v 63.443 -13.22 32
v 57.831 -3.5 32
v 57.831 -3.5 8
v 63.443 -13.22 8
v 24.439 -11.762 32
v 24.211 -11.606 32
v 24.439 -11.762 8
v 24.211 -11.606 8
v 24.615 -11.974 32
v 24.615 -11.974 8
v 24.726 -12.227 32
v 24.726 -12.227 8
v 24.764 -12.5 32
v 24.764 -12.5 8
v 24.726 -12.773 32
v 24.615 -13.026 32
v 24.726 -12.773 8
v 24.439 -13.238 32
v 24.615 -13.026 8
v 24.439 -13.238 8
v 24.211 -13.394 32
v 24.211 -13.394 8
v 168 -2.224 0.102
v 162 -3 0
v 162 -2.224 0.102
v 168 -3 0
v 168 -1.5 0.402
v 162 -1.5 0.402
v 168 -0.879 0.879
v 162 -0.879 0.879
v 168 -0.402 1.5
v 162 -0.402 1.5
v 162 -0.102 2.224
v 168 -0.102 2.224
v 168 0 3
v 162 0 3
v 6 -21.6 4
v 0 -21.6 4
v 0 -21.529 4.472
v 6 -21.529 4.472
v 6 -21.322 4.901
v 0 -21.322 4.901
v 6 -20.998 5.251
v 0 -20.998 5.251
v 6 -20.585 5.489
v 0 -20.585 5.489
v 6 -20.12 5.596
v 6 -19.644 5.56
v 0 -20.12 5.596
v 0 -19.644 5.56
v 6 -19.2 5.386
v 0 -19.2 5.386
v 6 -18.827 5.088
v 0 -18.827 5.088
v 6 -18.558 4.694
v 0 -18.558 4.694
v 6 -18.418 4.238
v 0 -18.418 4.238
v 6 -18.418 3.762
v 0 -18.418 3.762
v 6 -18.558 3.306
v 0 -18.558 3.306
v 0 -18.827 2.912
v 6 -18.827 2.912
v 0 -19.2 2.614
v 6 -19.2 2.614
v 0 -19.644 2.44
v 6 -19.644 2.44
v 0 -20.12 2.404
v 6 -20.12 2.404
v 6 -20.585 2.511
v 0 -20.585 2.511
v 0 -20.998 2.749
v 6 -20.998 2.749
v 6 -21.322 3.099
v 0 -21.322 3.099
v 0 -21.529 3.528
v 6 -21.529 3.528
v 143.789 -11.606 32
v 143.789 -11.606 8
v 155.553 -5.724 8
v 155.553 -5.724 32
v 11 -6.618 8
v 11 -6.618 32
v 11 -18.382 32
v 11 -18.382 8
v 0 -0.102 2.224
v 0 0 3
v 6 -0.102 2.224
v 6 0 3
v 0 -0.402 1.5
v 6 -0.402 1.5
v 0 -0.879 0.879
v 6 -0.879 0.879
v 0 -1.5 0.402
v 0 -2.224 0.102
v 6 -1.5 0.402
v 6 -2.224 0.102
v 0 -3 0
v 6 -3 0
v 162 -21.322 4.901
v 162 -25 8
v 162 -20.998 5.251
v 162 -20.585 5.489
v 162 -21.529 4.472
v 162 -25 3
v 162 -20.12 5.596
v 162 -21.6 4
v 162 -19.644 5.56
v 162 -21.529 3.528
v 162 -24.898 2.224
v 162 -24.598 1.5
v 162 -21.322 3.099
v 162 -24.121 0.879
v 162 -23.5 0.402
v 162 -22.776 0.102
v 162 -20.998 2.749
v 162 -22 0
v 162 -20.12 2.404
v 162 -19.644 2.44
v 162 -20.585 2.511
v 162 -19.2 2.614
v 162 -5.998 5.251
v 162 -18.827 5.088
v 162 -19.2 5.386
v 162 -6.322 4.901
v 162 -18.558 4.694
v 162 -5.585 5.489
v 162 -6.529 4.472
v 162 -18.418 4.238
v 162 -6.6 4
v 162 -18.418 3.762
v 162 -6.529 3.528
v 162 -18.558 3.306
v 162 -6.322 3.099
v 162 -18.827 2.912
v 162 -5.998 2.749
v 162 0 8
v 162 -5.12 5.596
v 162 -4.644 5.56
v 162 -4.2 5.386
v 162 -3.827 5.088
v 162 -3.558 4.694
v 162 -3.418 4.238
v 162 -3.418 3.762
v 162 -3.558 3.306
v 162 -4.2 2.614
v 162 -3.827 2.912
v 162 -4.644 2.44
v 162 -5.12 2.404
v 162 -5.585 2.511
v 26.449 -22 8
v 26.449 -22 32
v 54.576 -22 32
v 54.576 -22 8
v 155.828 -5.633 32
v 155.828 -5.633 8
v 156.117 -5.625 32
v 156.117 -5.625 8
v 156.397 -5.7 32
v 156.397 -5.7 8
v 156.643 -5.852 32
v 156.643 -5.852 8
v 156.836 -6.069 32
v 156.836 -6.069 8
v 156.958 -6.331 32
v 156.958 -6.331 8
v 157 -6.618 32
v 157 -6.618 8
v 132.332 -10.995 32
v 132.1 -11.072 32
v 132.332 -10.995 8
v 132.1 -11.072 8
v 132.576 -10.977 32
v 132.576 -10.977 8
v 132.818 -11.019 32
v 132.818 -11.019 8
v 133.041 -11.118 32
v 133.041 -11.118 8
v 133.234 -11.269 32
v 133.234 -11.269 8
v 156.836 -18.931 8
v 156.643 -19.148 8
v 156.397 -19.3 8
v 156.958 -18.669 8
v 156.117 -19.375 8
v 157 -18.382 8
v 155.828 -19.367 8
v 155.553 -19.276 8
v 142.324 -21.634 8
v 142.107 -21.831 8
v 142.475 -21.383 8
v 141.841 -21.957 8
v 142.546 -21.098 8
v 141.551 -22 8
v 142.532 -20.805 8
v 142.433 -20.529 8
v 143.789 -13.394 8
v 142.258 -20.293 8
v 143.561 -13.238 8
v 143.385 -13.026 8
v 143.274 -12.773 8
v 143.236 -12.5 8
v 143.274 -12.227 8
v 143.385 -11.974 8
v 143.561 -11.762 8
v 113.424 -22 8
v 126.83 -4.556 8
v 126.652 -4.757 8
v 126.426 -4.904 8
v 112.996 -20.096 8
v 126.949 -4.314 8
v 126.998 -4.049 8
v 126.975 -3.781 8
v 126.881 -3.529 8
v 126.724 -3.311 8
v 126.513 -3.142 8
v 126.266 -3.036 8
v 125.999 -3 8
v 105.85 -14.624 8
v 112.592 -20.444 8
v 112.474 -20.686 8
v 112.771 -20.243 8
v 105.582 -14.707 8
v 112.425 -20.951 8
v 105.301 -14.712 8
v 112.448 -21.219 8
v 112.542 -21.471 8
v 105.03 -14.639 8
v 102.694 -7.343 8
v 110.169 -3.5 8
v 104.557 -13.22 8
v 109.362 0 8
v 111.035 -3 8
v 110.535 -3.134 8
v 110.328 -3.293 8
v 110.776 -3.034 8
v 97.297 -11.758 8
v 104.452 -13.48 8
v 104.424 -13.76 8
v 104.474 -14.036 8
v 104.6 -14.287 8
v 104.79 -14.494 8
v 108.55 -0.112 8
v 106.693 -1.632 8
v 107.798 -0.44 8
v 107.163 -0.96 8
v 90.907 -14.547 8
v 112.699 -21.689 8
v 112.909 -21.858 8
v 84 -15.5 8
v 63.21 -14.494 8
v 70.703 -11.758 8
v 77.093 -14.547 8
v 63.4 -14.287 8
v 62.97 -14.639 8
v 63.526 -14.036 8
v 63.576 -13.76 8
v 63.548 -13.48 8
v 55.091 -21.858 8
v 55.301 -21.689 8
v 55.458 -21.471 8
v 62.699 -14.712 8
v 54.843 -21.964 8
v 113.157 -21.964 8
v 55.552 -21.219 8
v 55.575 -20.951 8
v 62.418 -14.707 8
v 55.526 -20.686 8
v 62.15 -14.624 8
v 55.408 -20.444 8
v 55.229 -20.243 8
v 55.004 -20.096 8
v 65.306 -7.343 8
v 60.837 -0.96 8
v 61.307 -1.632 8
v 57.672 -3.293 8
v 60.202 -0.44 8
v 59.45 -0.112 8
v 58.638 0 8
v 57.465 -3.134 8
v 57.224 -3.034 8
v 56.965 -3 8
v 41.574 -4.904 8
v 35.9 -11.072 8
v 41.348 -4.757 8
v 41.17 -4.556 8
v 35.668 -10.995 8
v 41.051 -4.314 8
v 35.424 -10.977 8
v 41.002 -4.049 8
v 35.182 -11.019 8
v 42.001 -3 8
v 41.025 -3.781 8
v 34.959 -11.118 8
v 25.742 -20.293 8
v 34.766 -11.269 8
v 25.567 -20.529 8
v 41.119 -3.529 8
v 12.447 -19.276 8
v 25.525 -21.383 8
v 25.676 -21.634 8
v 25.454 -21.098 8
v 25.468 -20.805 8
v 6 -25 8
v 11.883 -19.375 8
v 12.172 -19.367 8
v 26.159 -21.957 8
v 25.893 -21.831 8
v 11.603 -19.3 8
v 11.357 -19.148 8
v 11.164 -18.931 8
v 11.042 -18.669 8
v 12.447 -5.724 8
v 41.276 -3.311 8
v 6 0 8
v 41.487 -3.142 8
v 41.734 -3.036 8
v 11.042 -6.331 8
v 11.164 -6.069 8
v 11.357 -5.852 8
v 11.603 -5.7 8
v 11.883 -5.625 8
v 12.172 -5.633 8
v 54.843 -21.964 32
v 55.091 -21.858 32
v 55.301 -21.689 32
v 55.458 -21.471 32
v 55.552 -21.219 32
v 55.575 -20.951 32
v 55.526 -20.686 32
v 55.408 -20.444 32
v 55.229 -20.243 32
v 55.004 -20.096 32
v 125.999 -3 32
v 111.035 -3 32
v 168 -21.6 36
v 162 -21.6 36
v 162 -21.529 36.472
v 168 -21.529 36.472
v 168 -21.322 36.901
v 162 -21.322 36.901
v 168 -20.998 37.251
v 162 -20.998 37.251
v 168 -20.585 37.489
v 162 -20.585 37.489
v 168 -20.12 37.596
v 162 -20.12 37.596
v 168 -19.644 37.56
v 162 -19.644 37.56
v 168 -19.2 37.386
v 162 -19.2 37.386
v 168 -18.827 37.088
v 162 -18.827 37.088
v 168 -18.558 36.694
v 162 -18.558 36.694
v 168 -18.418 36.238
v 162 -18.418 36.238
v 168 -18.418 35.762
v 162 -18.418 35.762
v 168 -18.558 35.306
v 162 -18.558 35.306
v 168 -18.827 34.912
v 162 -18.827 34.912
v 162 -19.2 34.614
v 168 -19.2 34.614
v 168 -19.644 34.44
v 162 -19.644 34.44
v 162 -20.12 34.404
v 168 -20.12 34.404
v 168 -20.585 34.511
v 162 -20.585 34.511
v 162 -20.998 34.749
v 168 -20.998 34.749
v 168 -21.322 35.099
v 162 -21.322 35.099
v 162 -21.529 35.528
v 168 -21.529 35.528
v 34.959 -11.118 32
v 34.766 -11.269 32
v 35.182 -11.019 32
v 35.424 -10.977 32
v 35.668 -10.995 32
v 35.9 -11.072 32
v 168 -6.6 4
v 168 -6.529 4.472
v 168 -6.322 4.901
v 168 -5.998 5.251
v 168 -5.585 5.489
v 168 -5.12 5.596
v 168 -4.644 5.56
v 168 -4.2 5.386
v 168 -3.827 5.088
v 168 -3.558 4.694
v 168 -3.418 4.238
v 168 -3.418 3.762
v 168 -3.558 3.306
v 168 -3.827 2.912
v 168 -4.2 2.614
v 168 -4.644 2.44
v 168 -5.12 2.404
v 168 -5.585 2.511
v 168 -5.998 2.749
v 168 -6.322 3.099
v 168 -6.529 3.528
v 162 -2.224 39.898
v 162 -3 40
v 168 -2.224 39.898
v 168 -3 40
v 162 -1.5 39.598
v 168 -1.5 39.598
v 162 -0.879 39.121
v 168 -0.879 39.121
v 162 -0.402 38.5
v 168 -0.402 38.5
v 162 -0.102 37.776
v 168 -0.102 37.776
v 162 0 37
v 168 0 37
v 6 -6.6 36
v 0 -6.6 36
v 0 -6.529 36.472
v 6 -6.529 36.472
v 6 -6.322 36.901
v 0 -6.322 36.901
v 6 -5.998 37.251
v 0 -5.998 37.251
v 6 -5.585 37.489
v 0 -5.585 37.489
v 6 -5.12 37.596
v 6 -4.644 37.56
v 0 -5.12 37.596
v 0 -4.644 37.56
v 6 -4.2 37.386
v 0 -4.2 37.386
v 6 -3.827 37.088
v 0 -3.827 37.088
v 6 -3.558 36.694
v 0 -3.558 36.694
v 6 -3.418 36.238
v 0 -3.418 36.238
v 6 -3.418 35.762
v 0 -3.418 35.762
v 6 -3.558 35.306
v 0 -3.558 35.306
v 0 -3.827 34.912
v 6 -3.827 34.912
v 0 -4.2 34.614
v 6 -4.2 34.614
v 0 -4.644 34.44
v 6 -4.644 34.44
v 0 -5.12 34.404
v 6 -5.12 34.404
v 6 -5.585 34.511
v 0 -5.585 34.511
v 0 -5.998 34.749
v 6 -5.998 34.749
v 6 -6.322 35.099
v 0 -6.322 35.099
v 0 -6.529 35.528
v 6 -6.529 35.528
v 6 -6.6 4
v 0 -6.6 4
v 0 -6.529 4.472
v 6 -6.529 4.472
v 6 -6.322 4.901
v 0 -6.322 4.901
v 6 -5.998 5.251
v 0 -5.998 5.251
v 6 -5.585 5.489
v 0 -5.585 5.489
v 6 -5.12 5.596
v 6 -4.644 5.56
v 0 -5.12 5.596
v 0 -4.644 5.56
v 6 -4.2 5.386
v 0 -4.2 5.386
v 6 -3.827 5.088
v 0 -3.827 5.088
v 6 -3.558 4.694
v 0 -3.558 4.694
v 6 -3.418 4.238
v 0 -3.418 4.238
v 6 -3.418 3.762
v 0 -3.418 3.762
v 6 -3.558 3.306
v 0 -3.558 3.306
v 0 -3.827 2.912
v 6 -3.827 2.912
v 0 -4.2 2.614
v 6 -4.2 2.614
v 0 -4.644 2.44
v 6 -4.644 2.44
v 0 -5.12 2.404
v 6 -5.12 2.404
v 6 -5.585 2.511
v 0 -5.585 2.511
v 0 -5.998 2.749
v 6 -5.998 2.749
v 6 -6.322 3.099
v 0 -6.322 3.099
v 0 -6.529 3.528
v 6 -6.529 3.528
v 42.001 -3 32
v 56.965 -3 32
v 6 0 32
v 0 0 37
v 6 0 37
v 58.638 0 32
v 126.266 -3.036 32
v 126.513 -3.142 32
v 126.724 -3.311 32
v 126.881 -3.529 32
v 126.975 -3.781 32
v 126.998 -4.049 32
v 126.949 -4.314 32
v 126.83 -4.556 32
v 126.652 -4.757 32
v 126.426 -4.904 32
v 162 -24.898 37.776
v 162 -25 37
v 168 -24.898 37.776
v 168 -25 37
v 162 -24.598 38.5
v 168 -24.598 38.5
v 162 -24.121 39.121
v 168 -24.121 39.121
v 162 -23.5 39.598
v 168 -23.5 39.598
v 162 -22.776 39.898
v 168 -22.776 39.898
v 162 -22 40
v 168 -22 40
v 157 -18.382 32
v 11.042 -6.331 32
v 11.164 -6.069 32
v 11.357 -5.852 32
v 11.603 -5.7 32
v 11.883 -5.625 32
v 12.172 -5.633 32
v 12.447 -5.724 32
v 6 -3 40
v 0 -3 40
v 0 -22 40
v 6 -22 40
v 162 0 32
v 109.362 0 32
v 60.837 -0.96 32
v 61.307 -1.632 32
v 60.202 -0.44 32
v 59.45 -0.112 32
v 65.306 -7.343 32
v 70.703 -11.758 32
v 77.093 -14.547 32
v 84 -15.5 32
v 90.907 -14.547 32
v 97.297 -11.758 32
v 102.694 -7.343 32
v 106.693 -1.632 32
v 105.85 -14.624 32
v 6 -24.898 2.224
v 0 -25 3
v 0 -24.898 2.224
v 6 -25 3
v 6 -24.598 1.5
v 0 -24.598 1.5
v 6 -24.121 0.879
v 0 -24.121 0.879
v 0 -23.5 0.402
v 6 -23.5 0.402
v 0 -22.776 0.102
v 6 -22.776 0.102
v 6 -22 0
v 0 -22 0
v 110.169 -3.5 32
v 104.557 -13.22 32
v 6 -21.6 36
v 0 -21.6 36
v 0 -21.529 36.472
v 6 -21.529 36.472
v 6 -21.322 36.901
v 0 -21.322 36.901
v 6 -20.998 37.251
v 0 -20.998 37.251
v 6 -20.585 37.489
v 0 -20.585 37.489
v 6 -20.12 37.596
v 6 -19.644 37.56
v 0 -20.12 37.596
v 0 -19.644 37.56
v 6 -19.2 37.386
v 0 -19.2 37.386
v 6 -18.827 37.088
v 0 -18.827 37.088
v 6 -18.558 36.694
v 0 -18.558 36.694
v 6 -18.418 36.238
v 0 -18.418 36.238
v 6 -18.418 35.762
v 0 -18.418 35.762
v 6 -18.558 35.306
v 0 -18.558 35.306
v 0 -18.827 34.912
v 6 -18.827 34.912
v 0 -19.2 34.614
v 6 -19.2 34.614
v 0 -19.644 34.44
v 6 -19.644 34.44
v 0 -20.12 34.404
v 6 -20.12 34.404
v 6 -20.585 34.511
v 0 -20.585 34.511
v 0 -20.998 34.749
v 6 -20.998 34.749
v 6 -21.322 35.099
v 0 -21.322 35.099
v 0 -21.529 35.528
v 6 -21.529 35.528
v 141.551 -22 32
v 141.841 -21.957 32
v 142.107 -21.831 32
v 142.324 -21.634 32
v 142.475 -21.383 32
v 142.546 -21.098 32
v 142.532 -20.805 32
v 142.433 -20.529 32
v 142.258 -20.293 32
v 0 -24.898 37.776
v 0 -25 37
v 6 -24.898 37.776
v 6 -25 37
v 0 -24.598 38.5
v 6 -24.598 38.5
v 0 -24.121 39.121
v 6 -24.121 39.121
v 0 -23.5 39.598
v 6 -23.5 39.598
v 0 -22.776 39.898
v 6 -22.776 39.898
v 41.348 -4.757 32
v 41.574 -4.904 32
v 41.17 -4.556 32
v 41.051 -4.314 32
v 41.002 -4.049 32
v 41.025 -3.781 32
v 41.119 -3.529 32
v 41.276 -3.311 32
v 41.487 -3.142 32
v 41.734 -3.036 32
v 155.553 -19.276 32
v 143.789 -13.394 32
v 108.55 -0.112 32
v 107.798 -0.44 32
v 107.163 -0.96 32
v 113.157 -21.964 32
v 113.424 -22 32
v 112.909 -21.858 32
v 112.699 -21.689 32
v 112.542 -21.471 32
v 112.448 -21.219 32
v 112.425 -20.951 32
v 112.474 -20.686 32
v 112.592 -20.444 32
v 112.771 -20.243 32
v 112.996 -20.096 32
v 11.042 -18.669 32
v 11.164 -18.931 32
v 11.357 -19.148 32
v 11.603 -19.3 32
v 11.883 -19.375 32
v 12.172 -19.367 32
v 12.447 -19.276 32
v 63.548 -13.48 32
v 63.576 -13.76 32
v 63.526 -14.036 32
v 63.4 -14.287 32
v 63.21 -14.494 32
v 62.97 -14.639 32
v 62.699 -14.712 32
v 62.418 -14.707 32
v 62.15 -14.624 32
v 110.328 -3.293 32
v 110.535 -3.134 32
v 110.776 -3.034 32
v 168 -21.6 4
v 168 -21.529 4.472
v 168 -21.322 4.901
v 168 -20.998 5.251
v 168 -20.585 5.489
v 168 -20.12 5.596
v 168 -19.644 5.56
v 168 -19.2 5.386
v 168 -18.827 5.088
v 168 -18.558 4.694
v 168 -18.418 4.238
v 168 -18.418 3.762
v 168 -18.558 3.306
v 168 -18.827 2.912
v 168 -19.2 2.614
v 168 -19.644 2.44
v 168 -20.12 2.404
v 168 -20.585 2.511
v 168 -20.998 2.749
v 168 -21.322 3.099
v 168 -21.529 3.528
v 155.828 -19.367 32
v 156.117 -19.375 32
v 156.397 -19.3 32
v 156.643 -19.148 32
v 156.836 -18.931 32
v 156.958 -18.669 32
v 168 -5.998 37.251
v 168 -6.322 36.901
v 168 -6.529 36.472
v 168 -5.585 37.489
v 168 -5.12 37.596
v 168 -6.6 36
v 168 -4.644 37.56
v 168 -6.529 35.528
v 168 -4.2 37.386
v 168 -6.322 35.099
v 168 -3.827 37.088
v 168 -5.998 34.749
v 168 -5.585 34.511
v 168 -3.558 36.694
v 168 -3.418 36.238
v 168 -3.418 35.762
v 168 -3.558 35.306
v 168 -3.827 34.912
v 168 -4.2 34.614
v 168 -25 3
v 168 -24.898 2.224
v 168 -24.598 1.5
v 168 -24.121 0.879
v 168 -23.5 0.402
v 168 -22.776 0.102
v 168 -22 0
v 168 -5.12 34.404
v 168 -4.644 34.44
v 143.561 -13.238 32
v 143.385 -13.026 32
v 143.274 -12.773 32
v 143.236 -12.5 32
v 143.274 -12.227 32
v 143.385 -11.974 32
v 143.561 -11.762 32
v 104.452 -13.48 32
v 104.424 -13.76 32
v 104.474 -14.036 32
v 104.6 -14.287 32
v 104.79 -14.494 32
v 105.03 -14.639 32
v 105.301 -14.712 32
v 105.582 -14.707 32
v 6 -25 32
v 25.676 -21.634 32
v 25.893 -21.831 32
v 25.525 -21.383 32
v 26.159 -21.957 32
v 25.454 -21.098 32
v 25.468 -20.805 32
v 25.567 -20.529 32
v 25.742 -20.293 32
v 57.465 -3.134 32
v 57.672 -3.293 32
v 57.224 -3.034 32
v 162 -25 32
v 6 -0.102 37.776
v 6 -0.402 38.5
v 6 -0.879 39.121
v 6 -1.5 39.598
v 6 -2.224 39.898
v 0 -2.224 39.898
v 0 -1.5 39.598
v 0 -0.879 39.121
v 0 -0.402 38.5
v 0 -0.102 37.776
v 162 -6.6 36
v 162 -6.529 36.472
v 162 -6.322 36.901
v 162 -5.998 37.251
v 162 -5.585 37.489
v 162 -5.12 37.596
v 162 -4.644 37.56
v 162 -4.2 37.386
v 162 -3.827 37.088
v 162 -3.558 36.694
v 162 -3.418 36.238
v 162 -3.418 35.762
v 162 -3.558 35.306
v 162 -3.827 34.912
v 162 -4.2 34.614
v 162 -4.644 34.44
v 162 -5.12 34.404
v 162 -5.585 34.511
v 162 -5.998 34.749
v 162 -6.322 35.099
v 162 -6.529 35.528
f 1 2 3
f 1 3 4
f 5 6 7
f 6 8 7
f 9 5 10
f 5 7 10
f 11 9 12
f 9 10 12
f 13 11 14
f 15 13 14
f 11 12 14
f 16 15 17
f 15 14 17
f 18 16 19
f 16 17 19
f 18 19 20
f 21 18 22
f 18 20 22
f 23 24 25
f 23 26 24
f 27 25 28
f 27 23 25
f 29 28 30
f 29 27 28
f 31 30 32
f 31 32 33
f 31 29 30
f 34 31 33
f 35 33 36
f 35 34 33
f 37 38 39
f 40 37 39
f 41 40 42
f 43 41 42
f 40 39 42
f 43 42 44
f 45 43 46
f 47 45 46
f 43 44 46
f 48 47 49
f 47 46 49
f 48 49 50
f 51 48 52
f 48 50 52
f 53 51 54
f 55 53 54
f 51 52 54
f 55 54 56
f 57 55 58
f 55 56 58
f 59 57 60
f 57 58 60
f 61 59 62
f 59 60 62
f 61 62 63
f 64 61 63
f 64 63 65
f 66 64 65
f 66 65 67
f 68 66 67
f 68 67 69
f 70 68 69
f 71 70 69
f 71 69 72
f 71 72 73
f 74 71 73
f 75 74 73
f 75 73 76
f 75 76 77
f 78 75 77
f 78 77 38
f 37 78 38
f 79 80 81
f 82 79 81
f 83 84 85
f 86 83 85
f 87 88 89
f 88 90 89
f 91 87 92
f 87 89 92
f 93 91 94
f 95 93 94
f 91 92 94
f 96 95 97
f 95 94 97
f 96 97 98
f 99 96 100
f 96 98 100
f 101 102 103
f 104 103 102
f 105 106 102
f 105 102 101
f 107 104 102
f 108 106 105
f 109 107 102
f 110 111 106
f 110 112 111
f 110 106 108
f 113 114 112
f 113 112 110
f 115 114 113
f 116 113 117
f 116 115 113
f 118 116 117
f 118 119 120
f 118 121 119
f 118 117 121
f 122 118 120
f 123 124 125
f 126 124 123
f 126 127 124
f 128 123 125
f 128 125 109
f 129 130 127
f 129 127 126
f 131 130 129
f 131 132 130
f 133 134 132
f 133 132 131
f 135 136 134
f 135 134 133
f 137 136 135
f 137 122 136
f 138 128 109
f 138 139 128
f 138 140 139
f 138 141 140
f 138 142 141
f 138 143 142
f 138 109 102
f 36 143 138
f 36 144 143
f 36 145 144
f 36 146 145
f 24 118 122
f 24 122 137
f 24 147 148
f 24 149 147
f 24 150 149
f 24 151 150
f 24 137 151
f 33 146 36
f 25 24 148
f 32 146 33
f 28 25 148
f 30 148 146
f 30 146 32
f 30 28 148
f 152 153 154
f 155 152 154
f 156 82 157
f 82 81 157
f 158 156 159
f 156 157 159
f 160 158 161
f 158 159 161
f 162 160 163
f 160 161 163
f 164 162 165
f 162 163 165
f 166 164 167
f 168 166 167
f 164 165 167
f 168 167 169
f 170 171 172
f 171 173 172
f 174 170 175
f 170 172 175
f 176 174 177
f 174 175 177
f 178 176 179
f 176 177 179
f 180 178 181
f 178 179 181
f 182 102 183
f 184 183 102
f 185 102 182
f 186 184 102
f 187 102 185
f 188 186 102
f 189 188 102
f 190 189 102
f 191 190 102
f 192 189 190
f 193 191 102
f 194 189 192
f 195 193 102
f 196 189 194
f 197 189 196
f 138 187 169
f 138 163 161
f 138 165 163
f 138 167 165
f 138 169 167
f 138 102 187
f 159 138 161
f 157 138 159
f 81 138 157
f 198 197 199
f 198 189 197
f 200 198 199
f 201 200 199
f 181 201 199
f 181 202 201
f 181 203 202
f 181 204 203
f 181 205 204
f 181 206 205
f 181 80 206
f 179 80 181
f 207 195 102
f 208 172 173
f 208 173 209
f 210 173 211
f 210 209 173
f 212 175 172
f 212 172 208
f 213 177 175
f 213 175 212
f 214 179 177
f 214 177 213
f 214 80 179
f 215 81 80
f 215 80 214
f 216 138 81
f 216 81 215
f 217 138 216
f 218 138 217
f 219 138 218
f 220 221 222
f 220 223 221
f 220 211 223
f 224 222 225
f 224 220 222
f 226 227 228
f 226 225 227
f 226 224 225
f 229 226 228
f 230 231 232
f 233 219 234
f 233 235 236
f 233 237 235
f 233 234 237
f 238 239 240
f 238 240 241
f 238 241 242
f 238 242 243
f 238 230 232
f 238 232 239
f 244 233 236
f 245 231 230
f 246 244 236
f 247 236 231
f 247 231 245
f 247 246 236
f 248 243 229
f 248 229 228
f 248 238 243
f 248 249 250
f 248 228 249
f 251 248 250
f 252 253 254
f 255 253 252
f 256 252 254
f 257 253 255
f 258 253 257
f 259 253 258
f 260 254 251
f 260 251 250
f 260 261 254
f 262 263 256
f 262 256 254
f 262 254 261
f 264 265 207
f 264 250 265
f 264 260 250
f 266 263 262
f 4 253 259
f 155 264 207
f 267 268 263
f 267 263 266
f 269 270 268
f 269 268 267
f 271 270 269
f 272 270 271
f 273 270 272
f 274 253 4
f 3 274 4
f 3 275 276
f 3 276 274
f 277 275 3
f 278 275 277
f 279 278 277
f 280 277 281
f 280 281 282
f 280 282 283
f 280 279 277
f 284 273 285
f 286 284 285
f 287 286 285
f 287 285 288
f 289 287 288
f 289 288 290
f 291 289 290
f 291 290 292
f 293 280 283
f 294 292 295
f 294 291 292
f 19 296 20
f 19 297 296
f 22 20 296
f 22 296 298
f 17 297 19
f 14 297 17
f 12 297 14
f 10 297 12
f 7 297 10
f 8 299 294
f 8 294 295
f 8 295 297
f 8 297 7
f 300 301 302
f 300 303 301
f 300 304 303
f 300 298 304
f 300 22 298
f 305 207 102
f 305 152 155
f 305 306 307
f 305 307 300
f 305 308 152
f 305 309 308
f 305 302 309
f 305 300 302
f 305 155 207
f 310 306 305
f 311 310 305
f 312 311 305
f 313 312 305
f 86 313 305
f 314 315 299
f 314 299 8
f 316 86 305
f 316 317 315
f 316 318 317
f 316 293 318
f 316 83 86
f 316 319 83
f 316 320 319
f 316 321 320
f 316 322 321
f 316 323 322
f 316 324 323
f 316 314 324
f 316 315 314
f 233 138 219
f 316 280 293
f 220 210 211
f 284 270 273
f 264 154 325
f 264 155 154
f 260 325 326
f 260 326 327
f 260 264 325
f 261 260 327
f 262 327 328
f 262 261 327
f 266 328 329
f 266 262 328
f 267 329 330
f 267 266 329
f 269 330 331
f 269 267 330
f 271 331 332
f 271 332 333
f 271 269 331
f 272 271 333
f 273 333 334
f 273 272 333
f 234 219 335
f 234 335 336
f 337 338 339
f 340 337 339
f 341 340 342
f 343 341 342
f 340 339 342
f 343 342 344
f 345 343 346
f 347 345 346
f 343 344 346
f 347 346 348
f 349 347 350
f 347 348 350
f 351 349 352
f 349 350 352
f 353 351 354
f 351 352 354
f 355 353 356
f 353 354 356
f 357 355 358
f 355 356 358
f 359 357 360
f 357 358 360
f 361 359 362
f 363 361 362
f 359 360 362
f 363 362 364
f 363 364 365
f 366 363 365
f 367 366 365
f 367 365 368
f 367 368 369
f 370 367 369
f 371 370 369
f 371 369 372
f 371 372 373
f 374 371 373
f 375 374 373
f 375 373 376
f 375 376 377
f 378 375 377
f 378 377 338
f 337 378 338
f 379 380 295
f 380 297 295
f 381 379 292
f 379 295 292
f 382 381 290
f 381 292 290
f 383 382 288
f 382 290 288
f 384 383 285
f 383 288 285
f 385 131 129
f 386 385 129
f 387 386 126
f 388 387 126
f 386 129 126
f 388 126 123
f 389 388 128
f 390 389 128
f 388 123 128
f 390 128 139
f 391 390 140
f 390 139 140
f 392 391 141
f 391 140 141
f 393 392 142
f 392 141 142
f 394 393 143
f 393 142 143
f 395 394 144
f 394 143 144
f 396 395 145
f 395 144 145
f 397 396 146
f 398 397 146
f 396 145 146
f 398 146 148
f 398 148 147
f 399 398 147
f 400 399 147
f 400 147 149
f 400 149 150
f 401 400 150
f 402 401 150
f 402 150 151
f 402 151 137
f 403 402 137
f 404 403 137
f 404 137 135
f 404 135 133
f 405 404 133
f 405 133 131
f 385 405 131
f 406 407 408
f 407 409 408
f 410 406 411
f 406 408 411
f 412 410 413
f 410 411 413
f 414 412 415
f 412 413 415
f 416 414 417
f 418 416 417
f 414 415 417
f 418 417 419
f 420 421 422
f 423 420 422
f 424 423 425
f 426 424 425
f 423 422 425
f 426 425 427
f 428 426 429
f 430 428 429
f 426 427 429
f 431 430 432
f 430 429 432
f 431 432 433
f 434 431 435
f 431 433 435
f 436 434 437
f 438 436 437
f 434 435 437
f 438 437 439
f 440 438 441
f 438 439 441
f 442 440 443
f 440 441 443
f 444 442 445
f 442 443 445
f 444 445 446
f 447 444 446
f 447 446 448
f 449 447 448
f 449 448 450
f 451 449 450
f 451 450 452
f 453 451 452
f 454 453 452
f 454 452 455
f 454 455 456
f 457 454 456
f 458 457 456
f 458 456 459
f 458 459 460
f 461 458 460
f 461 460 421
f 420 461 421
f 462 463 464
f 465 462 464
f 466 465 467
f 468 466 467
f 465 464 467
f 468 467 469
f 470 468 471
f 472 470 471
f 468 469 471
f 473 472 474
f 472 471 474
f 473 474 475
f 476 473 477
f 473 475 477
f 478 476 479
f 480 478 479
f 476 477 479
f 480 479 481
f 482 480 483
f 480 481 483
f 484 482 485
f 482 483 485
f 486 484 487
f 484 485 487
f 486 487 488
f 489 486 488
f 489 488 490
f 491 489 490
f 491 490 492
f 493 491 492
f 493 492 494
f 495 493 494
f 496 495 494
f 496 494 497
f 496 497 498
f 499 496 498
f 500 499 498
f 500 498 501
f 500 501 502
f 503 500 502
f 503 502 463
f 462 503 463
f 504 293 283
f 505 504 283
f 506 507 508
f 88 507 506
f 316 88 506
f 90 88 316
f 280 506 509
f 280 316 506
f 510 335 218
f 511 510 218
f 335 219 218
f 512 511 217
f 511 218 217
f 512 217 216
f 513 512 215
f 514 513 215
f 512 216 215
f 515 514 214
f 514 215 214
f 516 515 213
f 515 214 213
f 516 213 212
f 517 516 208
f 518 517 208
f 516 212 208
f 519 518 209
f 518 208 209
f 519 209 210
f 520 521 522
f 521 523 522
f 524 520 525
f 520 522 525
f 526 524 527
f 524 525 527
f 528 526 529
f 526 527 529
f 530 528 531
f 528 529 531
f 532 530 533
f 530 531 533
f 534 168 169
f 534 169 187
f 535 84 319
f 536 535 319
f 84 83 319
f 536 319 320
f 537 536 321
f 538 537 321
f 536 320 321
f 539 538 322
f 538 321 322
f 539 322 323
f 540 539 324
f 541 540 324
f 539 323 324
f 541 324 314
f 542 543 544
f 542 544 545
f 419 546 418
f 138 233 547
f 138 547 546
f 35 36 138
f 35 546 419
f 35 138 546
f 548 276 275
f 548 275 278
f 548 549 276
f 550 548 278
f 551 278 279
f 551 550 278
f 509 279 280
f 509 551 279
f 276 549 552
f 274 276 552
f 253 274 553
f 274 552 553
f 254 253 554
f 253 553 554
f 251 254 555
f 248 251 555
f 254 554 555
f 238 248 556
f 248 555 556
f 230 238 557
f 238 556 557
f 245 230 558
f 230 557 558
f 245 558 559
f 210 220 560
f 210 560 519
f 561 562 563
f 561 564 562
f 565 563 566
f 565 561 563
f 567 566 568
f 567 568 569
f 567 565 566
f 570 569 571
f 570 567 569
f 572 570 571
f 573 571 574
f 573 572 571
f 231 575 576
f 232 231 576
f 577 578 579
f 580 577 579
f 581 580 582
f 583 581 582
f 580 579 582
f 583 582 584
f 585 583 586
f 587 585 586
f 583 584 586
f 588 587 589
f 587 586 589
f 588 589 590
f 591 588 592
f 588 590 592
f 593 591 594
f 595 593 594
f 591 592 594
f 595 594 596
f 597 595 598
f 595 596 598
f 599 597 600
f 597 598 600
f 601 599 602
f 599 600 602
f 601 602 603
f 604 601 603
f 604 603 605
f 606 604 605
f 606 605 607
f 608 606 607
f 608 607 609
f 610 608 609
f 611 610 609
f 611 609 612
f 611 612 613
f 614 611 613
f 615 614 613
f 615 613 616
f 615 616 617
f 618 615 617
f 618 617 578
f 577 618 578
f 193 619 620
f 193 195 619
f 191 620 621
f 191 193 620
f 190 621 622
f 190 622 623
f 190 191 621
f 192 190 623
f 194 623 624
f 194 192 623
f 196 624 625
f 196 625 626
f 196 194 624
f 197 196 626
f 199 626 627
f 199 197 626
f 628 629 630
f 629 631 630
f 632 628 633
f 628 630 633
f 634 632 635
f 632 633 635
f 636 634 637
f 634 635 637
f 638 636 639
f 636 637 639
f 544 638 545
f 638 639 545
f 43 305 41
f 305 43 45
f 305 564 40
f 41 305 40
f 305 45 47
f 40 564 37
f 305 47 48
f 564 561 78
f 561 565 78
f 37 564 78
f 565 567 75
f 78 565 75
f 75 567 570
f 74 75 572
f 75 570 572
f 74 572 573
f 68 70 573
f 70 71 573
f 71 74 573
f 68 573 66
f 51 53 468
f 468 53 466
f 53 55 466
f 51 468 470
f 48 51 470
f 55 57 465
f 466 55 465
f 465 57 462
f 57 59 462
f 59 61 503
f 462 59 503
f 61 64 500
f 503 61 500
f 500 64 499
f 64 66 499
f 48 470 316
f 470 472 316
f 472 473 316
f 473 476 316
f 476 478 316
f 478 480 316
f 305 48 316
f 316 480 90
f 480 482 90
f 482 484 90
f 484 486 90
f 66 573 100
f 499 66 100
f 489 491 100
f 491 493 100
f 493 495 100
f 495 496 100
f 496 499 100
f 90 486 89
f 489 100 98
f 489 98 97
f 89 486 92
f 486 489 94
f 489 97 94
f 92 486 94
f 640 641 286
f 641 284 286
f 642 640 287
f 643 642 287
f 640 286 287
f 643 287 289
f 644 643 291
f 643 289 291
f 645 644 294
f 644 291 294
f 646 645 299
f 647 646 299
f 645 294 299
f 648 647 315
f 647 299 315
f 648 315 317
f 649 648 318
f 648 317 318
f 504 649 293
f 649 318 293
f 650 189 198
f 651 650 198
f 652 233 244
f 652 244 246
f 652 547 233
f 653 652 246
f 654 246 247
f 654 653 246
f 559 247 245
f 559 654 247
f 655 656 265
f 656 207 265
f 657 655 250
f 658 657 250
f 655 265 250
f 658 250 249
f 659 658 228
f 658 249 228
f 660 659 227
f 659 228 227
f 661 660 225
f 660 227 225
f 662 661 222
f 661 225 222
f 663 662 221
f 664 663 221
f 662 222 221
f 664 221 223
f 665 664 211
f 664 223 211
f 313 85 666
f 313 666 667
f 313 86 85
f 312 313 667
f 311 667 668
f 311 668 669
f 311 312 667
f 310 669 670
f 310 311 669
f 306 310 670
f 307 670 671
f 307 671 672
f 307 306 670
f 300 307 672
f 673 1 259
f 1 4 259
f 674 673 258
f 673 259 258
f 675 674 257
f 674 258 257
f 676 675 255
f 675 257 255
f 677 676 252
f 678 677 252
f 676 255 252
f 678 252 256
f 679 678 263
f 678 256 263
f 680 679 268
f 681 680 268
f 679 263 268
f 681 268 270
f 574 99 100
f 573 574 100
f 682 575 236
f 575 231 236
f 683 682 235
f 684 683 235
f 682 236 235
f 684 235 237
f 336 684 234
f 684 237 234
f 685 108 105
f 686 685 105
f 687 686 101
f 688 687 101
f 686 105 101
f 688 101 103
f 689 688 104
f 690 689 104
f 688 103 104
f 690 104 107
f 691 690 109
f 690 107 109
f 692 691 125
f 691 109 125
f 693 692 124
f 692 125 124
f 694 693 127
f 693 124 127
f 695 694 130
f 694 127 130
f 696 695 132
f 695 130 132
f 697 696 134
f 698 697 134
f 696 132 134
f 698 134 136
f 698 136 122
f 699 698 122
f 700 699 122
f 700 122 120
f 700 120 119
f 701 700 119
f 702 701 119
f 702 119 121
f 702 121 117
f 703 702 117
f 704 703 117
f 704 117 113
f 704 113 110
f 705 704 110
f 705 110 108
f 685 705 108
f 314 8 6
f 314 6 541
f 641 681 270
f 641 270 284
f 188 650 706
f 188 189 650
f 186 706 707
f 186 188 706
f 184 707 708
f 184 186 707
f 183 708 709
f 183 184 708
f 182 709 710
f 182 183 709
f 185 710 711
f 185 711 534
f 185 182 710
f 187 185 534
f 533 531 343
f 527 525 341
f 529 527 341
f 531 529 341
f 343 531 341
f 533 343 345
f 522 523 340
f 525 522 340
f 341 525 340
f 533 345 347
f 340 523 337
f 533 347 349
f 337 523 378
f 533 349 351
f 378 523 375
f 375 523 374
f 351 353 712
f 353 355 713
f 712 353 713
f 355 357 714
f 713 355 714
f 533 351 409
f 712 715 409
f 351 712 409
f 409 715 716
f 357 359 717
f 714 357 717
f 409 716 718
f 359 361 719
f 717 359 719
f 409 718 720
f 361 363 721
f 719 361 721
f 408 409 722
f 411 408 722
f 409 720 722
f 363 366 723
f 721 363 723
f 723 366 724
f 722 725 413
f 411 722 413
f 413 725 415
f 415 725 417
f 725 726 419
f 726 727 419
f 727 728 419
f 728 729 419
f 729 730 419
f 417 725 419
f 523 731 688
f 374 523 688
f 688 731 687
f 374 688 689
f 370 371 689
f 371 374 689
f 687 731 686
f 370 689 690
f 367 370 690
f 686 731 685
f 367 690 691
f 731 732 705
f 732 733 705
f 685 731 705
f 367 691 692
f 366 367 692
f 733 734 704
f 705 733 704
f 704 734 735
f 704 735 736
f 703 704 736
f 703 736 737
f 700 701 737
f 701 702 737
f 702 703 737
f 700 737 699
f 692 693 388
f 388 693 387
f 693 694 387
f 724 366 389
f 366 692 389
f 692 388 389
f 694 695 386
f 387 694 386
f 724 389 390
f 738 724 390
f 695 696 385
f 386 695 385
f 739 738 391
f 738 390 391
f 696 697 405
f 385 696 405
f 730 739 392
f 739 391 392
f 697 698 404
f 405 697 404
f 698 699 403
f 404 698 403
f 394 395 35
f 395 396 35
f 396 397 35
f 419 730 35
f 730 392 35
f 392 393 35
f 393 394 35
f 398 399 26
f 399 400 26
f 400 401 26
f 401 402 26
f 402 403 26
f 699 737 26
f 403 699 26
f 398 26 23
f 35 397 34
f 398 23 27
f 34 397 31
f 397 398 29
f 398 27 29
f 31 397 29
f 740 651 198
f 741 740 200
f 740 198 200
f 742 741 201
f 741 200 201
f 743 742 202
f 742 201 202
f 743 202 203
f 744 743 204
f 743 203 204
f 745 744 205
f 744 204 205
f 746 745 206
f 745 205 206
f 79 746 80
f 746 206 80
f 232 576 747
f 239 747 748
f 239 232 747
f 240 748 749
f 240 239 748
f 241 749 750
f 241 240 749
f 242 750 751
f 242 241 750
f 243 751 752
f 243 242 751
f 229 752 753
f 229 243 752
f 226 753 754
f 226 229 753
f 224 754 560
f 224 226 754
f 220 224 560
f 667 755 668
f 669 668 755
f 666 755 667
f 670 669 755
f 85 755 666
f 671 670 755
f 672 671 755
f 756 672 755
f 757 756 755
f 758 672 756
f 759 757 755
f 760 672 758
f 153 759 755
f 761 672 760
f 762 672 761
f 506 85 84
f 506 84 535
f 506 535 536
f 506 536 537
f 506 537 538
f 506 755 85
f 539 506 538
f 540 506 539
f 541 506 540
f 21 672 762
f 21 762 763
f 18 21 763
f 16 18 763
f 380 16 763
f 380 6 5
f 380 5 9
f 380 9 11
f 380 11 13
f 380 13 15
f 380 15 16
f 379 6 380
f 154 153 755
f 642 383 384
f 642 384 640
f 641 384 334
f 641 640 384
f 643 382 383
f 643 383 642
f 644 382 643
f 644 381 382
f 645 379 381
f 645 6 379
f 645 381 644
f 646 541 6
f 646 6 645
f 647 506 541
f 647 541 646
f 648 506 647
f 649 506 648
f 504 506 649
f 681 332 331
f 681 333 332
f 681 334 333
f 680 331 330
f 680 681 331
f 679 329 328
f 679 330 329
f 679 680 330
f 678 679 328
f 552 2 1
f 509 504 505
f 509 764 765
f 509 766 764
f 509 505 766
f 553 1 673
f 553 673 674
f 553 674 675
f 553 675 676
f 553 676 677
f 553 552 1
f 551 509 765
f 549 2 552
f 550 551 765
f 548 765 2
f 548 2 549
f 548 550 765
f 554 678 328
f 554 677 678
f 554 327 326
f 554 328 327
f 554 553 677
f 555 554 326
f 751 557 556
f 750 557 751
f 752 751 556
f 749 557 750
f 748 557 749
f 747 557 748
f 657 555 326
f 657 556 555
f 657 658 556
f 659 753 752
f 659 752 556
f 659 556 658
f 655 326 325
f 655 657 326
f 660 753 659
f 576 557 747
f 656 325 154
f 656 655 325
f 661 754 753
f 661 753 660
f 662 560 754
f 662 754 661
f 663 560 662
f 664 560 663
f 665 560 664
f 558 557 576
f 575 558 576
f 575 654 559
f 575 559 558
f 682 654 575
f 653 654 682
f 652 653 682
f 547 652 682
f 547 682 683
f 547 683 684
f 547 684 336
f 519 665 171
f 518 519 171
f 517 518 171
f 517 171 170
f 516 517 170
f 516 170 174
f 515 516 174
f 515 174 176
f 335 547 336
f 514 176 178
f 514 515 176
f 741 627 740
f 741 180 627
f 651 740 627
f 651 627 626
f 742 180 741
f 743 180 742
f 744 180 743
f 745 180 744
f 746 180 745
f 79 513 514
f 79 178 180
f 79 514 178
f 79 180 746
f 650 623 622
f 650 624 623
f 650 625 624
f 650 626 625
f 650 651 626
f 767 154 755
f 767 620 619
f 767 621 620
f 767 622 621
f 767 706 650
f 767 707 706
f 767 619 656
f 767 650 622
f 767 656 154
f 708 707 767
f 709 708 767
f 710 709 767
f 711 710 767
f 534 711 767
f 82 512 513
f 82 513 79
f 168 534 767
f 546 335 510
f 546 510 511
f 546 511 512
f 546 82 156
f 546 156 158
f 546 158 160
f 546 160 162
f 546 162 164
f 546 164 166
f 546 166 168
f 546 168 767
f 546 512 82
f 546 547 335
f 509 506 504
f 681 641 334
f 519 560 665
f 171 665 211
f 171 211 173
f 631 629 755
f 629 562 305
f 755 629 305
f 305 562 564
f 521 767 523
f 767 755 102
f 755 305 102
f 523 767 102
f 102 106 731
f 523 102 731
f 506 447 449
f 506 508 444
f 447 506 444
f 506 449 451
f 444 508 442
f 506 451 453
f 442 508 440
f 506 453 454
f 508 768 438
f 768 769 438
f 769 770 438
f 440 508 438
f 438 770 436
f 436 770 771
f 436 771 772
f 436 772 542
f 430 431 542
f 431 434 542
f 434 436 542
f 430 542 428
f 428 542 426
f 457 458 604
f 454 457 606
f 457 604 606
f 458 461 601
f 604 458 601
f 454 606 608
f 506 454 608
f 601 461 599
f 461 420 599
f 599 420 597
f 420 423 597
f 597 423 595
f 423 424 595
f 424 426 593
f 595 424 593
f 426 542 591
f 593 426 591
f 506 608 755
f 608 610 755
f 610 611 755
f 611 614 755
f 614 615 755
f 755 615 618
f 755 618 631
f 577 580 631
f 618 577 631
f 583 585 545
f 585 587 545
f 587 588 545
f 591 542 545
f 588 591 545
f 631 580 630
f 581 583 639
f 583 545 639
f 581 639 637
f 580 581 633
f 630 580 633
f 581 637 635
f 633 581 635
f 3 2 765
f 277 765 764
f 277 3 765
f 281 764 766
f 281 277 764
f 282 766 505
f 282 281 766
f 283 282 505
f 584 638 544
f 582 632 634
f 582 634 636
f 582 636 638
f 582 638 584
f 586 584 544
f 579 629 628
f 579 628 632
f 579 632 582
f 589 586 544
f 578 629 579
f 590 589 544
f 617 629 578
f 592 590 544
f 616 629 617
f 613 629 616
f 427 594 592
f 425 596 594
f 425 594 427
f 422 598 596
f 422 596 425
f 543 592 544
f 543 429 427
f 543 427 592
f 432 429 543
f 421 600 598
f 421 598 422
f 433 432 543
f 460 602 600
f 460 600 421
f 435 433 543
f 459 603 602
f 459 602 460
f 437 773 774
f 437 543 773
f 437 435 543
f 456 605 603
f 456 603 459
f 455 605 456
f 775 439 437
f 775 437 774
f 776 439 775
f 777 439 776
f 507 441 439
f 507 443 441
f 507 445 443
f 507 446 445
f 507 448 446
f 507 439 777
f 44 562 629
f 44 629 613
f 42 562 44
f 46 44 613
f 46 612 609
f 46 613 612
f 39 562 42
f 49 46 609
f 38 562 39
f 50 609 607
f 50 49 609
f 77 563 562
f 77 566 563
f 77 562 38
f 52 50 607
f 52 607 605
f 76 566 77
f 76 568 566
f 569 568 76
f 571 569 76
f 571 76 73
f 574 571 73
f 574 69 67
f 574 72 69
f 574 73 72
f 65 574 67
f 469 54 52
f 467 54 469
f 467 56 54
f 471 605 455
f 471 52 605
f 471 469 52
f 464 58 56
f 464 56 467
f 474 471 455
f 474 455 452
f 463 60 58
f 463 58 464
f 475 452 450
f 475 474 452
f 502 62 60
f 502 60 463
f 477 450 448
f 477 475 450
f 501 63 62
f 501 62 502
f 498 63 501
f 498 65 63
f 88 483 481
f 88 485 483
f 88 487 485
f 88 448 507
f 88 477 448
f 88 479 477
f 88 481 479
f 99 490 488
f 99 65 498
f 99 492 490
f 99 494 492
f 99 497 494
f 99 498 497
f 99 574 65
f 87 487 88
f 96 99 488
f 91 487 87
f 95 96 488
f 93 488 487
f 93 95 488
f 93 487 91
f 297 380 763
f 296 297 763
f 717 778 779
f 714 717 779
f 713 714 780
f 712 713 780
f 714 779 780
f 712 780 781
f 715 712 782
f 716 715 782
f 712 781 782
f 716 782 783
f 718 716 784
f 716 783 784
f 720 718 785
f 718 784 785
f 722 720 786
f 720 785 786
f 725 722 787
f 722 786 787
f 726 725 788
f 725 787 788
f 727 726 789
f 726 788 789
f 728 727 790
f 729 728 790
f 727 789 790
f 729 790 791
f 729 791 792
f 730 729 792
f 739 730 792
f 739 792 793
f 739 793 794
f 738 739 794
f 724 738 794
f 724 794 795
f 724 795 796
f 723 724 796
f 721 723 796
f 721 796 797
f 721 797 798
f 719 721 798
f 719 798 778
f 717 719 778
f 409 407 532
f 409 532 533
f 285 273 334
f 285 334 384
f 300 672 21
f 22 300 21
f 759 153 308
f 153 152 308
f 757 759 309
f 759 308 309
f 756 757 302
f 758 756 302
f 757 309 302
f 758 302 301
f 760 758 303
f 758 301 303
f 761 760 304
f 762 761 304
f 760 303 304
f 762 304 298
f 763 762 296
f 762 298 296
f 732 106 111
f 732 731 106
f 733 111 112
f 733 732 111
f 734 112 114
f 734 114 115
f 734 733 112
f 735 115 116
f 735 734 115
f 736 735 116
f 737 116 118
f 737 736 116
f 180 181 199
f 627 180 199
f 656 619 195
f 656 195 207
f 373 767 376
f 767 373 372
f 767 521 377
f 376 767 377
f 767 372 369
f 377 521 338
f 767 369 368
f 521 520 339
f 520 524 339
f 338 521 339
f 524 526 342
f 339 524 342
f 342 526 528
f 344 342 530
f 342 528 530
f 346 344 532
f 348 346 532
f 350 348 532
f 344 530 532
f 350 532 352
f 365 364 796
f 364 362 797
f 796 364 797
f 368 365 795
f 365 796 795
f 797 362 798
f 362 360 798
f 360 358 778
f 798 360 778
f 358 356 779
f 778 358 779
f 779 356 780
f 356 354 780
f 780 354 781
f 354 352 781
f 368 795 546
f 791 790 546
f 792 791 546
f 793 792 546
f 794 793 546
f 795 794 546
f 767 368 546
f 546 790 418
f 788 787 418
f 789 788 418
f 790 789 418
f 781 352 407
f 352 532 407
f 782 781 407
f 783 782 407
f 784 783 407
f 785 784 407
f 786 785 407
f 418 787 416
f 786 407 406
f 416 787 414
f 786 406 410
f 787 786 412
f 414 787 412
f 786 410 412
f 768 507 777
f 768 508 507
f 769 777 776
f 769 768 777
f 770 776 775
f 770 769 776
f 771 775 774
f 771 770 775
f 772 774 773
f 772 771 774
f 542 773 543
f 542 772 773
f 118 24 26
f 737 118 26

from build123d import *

# Parameters (mm, degrees)
SKETCH_1_W          = 168
SKETCH_1_H          = 25
EXTRUDE_1_DEPTH     = 40
SKETCH_2_R          = 25.5
CUT_EXTRUDE_1_DEPTH = 175.496418301
SKETCH_3_W          = 156
SKETCH_3_H          = 25
CUT_EXTRUDE_2_DEPTH = 8
CUT_EXTRUDE_3_DEPTH = 8
SKETCH_5_R          = 1.6
CUT_EXTRUDE_4_DEPTH = 175.496418301
CUT_EXTRUDE_5_DEPTH = 173.838074509
FILLET_2_R          = 1
FILLET_3_R          = 3
FILLET_4_R          = 3
FILLET_5_R          = 3


with BuildPart() as part:
    # 草图1 → 凸台-拉伸1 (new body)
    with BuildSketch(Plane.XY):
        with Locations((84, -12.5)):
            Rectangle(SKETCH_1_W, SKETCH_1_H)
    extrude(amount=EXTRUDE_1_DEPTH)

    # 草图2 → 切除-拉伸1 (cut, through all)
    with BuildSketch(Plane.XY.offset(40)):
        with Locations((84, 10)):
            Circle(SKETCH_2_R)
    extrude(amount=-CUT_EXTRUDE_1_DEPTH, mode=Mode.SUBTRACT)

    # 草图3 → 切除-拉伸2 (cut)
    with BuildSketch(Plane(origin=(0, 0, 0), x_dir=(-1, 0, 0), z_dir=(0, 0, -1))):
        with Locations((-84, -12.5)):
            Rectangle(SKETCH_3_W, SKETCH_3_H)
    extrude(amount=-CUT_EXTRUDE_2_DEPTH, mode=Mode.SUBTRACT)

    # 草图4 → 切除-拉伸3 (cut)
    with BuildSketch(Plane.XY.offset(40)):
        with BuildLine():
            Line((162, 0), (107.457408211, 0))
            ThreePointArc((107.457408211, 0), (84, -15.5), (60.542591789, 0))
            Line((60.542591789, 0), (6, 0))
            Line((6, 0), (6, -25))
            Line((6, -25), (162, -25))
            Line((162, -25), (162, 0))
        make_face()
    extrude(amount=-CUT_EXTRUDE_3_DEPTH, mode=Mode.SUBTRACT)

    # 草图5 → 切除-拉伸4 (cut, through all)
    with BuildSketch(Plane.ZY):
        with Locations((4, -5)):
            Circle(SKETCH_5_R)
        with Locations((4, -20)):
            Circle(SKETCH_5_R)
        with Locations((36, -20)):
            Circle(SKETCH_5_R)
        with Locations((36, -5)):
            Circle(SKETCH_5_R)
    extrude(amount=-CUT_EXTRUDE_4_DEPTH, mode=Mode.SUBTRACT)

    # 草图7 → 切除-拉伸5 (cut, through all)
    with BuildSketch(Plane.XY.offset(32)):
        Polygon((37.542591789, -3), (57.542591789, -3), (65.042591789, -15.990381057), align=None)
        Polygon((24.034609426, -22), (59.034609426, -22), (35.263531583, -10.771077843), align=None)
        Polygon((11, -5), (11, -20), (26, -12.5), align=None)
        Polygon((157, -5), (157, -20), (142, -12.5), align=None)
        Polygon((132.736468417, -10.771077843), (143.965390574, -22), (108.965390574, -22), align=None)
        Polygon((110.457408211, -3), (102.957408211, -15.990381057), (130.457408211, -3), align=None)
    extrude(amount=-CUT_EXTRUDE_5_DEPTH, mode=Mode.SUBTRACT)

    # 圆角2
    fillet_2_edges = [part.edges().sort_by_distance(p)[0] for p in [
        (37.542591789, -3, 20),
        (57.542591789, -3, 20),
        (130.457408211, -3, 20),
        (102.957408211, -15.990381057, 20),
        (110.457408211, -3, 20),
        (157, -5, 20),
        (157, -20, 20),
        (142, -12.5, 20),
        (132.736468417, -10.771077843, 20),
        (143.965390574, -22, 20),
        (108.965390574, -22, 20),
        (35.263531583, -10.771077843, 20),
        (59.034609426, -22, 20),
        (24.034609426, -22, 20),
        (26, -12.5, 20),
        (11, -20, 20),
        (11, -5, 20),
        (65.042591789, -15.990381057, 20),
    ]]
    fillet(fillet_2_edges, radius=FILLET_2_R)

    # 圆角3
    fillet_3_edges = [part.edges().sort_by_distance(p)[0] for p in [
        (107.457408211, 0, 20),
        (60.542591789, 0, 20),
    ]]
    fillet(fillet_3_edges, radius=FILLET_3_R)

    # 圆角4
    fillet_4_edges = [part.edges().sort_by_distance(p)[0] for p in [
        (3, 0, 0),
        (3, -25, 40),
        (3, -25, 0),
        (3, 0, 40),
    ]]
    fillet(fillet_4_edges, radius=FILLET_4_R)

    # 圆角5
    fillet_5_edges = [part.edges().sort_by_distance(p)[0] for p in [
        (165, -25, 0),
        (165, -25, 40),
        (165, 0, 0),
        (165, 0, 40),
    ]]
    fillet(fillet_5_edges, radius=FILLET_5_R)


solid = part.part
